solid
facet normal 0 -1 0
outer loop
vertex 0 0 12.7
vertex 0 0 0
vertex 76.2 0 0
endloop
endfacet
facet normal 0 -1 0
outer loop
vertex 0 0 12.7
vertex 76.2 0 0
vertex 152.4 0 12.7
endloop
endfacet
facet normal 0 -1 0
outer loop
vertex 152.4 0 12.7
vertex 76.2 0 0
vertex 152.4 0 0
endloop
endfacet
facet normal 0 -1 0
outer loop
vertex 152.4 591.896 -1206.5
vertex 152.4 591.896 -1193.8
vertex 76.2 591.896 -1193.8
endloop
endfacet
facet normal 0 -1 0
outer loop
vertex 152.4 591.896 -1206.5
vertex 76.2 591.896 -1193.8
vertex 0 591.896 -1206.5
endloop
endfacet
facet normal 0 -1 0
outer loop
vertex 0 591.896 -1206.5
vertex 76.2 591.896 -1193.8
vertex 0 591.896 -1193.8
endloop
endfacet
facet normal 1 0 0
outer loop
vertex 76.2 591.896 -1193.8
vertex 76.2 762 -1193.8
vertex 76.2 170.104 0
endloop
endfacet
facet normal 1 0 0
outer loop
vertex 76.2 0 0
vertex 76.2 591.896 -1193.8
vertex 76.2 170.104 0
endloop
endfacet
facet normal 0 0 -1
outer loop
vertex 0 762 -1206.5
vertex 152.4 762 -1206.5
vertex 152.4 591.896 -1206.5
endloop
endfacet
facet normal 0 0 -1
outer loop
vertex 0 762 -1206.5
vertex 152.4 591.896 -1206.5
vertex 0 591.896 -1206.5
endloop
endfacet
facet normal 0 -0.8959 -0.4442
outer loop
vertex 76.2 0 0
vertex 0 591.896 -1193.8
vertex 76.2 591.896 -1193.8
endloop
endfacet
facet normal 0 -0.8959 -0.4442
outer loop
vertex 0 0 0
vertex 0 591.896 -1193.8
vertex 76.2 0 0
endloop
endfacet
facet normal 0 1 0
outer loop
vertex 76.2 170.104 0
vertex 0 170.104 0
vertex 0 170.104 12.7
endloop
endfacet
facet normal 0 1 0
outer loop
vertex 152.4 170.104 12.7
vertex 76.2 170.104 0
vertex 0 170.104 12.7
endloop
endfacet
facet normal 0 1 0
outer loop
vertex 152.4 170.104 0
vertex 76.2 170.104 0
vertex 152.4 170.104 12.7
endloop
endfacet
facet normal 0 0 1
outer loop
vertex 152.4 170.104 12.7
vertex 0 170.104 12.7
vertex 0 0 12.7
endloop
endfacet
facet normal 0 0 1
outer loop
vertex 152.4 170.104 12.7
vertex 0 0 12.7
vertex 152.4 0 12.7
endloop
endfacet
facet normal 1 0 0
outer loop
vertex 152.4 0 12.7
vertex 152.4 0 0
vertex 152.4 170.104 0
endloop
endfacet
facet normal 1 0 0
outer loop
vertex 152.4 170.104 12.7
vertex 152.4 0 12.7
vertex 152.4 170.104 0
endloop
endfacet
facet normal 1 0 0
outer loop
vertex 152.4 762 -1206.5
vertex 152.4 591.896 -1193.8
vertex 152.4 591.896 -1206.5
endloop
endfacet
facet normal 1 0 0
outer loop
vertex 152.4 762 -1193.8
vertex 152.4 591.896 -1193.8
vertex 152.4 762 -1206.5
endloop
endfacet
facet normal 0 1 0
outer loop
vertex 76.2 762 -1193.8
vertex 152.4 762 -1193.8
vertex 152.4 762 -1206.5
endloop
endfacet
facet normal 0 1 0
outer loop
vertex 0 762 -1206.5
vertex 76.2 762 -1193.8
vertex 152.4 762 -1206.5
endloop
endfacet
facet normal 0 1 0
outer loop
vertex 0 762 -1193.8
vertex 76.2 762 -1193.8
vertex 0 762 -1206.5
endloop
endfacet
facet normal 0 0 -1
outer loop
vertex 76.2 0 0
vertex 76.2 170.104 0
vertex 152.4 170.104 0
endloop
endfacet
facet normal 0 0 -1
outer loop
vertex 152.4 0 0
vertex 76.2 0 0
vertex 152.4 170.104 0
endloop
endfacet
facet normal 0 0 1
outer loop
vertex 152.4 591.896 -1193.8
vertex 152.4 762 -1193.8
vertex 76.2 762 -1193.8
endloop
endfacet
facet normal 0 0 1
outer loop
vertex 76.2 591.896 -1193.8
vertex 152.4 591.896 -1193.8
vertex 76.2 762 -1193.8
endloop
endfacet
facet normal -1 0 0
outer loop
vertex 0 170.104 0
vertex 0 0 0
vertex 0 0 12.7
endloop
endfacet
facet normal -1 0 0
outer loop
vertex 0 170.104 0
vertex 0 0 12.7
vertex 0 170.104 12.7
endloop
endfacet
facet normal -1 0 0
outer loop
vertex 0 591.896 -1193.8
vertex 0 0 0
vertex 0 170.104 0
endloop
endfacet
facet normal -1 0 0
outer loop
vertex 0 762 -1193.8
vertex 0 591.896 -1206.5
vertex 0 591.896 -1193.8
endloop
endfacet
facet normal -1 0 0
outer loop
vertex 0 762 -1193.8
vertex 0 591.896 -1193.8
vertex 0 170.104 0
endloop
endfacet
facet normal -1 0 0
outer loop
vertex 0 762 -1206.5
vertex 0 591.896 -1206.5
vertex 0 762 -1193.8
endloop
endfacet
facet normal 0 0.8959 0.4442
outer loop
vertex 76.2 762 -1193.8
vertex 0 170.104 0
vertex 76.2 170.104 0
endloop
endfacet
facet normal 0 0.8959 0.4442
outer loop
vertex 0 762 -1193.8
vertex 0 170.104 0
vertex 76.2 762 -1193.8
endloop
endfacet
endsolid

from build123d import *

# Parameters (mm, degrees)
BOSS_EXTRUDE1_DEPTH = 76.2
SKETCH5_W           = 152.4
SKETCH5_H           = 170.103674112
BOSS_EXTRUDE3_DEPTH = 12.7
SKETCH6_W           = 152.4
SKETCH6_H           = 170.103674112
BOSS_EXTRUDE4_DEPTH = 12.7


with BuildPart() as part:
    # Sketch2 → Boss-Extrude1 (new body)
    with BuildSketch(Plane(origin=(0, 0, 0), x_dir=(0, 0, -1), z_dir=(1, 0, 0))):
        Polygon((0, 0), (0, 170.103674112), (1193.8, 762), (1193.8, 591.896325888), align=None)
    extrude(amount=BOSS_EXTRUDE1_DEPTH)

    # Sketch5 → Boss-Extrude3 (add)
    with BuildSketch(Plane(origin=(0, 0, -1193.8), x_dir=(-1, 0, 0), z_dir=(0, 0, -1))):
        with Locations((-76.2, 676.948162944)):
            Rectangle(SKETCH5_W, SKETCH5_H)
    extrude(amount=BOSS_EXTRUDE3_DEPTH)

    # Sketch6 → Boss-Extrude4 (add)
    with BuildSketch(Plane.XY):
        with Locations((76.2, 85.051837056)):
            Rectangle(SKETCH6_W, SKETCH6_H)
    extrude(amount=BOSS_EXTRUDE4_DEPTH)


solid = part.part
